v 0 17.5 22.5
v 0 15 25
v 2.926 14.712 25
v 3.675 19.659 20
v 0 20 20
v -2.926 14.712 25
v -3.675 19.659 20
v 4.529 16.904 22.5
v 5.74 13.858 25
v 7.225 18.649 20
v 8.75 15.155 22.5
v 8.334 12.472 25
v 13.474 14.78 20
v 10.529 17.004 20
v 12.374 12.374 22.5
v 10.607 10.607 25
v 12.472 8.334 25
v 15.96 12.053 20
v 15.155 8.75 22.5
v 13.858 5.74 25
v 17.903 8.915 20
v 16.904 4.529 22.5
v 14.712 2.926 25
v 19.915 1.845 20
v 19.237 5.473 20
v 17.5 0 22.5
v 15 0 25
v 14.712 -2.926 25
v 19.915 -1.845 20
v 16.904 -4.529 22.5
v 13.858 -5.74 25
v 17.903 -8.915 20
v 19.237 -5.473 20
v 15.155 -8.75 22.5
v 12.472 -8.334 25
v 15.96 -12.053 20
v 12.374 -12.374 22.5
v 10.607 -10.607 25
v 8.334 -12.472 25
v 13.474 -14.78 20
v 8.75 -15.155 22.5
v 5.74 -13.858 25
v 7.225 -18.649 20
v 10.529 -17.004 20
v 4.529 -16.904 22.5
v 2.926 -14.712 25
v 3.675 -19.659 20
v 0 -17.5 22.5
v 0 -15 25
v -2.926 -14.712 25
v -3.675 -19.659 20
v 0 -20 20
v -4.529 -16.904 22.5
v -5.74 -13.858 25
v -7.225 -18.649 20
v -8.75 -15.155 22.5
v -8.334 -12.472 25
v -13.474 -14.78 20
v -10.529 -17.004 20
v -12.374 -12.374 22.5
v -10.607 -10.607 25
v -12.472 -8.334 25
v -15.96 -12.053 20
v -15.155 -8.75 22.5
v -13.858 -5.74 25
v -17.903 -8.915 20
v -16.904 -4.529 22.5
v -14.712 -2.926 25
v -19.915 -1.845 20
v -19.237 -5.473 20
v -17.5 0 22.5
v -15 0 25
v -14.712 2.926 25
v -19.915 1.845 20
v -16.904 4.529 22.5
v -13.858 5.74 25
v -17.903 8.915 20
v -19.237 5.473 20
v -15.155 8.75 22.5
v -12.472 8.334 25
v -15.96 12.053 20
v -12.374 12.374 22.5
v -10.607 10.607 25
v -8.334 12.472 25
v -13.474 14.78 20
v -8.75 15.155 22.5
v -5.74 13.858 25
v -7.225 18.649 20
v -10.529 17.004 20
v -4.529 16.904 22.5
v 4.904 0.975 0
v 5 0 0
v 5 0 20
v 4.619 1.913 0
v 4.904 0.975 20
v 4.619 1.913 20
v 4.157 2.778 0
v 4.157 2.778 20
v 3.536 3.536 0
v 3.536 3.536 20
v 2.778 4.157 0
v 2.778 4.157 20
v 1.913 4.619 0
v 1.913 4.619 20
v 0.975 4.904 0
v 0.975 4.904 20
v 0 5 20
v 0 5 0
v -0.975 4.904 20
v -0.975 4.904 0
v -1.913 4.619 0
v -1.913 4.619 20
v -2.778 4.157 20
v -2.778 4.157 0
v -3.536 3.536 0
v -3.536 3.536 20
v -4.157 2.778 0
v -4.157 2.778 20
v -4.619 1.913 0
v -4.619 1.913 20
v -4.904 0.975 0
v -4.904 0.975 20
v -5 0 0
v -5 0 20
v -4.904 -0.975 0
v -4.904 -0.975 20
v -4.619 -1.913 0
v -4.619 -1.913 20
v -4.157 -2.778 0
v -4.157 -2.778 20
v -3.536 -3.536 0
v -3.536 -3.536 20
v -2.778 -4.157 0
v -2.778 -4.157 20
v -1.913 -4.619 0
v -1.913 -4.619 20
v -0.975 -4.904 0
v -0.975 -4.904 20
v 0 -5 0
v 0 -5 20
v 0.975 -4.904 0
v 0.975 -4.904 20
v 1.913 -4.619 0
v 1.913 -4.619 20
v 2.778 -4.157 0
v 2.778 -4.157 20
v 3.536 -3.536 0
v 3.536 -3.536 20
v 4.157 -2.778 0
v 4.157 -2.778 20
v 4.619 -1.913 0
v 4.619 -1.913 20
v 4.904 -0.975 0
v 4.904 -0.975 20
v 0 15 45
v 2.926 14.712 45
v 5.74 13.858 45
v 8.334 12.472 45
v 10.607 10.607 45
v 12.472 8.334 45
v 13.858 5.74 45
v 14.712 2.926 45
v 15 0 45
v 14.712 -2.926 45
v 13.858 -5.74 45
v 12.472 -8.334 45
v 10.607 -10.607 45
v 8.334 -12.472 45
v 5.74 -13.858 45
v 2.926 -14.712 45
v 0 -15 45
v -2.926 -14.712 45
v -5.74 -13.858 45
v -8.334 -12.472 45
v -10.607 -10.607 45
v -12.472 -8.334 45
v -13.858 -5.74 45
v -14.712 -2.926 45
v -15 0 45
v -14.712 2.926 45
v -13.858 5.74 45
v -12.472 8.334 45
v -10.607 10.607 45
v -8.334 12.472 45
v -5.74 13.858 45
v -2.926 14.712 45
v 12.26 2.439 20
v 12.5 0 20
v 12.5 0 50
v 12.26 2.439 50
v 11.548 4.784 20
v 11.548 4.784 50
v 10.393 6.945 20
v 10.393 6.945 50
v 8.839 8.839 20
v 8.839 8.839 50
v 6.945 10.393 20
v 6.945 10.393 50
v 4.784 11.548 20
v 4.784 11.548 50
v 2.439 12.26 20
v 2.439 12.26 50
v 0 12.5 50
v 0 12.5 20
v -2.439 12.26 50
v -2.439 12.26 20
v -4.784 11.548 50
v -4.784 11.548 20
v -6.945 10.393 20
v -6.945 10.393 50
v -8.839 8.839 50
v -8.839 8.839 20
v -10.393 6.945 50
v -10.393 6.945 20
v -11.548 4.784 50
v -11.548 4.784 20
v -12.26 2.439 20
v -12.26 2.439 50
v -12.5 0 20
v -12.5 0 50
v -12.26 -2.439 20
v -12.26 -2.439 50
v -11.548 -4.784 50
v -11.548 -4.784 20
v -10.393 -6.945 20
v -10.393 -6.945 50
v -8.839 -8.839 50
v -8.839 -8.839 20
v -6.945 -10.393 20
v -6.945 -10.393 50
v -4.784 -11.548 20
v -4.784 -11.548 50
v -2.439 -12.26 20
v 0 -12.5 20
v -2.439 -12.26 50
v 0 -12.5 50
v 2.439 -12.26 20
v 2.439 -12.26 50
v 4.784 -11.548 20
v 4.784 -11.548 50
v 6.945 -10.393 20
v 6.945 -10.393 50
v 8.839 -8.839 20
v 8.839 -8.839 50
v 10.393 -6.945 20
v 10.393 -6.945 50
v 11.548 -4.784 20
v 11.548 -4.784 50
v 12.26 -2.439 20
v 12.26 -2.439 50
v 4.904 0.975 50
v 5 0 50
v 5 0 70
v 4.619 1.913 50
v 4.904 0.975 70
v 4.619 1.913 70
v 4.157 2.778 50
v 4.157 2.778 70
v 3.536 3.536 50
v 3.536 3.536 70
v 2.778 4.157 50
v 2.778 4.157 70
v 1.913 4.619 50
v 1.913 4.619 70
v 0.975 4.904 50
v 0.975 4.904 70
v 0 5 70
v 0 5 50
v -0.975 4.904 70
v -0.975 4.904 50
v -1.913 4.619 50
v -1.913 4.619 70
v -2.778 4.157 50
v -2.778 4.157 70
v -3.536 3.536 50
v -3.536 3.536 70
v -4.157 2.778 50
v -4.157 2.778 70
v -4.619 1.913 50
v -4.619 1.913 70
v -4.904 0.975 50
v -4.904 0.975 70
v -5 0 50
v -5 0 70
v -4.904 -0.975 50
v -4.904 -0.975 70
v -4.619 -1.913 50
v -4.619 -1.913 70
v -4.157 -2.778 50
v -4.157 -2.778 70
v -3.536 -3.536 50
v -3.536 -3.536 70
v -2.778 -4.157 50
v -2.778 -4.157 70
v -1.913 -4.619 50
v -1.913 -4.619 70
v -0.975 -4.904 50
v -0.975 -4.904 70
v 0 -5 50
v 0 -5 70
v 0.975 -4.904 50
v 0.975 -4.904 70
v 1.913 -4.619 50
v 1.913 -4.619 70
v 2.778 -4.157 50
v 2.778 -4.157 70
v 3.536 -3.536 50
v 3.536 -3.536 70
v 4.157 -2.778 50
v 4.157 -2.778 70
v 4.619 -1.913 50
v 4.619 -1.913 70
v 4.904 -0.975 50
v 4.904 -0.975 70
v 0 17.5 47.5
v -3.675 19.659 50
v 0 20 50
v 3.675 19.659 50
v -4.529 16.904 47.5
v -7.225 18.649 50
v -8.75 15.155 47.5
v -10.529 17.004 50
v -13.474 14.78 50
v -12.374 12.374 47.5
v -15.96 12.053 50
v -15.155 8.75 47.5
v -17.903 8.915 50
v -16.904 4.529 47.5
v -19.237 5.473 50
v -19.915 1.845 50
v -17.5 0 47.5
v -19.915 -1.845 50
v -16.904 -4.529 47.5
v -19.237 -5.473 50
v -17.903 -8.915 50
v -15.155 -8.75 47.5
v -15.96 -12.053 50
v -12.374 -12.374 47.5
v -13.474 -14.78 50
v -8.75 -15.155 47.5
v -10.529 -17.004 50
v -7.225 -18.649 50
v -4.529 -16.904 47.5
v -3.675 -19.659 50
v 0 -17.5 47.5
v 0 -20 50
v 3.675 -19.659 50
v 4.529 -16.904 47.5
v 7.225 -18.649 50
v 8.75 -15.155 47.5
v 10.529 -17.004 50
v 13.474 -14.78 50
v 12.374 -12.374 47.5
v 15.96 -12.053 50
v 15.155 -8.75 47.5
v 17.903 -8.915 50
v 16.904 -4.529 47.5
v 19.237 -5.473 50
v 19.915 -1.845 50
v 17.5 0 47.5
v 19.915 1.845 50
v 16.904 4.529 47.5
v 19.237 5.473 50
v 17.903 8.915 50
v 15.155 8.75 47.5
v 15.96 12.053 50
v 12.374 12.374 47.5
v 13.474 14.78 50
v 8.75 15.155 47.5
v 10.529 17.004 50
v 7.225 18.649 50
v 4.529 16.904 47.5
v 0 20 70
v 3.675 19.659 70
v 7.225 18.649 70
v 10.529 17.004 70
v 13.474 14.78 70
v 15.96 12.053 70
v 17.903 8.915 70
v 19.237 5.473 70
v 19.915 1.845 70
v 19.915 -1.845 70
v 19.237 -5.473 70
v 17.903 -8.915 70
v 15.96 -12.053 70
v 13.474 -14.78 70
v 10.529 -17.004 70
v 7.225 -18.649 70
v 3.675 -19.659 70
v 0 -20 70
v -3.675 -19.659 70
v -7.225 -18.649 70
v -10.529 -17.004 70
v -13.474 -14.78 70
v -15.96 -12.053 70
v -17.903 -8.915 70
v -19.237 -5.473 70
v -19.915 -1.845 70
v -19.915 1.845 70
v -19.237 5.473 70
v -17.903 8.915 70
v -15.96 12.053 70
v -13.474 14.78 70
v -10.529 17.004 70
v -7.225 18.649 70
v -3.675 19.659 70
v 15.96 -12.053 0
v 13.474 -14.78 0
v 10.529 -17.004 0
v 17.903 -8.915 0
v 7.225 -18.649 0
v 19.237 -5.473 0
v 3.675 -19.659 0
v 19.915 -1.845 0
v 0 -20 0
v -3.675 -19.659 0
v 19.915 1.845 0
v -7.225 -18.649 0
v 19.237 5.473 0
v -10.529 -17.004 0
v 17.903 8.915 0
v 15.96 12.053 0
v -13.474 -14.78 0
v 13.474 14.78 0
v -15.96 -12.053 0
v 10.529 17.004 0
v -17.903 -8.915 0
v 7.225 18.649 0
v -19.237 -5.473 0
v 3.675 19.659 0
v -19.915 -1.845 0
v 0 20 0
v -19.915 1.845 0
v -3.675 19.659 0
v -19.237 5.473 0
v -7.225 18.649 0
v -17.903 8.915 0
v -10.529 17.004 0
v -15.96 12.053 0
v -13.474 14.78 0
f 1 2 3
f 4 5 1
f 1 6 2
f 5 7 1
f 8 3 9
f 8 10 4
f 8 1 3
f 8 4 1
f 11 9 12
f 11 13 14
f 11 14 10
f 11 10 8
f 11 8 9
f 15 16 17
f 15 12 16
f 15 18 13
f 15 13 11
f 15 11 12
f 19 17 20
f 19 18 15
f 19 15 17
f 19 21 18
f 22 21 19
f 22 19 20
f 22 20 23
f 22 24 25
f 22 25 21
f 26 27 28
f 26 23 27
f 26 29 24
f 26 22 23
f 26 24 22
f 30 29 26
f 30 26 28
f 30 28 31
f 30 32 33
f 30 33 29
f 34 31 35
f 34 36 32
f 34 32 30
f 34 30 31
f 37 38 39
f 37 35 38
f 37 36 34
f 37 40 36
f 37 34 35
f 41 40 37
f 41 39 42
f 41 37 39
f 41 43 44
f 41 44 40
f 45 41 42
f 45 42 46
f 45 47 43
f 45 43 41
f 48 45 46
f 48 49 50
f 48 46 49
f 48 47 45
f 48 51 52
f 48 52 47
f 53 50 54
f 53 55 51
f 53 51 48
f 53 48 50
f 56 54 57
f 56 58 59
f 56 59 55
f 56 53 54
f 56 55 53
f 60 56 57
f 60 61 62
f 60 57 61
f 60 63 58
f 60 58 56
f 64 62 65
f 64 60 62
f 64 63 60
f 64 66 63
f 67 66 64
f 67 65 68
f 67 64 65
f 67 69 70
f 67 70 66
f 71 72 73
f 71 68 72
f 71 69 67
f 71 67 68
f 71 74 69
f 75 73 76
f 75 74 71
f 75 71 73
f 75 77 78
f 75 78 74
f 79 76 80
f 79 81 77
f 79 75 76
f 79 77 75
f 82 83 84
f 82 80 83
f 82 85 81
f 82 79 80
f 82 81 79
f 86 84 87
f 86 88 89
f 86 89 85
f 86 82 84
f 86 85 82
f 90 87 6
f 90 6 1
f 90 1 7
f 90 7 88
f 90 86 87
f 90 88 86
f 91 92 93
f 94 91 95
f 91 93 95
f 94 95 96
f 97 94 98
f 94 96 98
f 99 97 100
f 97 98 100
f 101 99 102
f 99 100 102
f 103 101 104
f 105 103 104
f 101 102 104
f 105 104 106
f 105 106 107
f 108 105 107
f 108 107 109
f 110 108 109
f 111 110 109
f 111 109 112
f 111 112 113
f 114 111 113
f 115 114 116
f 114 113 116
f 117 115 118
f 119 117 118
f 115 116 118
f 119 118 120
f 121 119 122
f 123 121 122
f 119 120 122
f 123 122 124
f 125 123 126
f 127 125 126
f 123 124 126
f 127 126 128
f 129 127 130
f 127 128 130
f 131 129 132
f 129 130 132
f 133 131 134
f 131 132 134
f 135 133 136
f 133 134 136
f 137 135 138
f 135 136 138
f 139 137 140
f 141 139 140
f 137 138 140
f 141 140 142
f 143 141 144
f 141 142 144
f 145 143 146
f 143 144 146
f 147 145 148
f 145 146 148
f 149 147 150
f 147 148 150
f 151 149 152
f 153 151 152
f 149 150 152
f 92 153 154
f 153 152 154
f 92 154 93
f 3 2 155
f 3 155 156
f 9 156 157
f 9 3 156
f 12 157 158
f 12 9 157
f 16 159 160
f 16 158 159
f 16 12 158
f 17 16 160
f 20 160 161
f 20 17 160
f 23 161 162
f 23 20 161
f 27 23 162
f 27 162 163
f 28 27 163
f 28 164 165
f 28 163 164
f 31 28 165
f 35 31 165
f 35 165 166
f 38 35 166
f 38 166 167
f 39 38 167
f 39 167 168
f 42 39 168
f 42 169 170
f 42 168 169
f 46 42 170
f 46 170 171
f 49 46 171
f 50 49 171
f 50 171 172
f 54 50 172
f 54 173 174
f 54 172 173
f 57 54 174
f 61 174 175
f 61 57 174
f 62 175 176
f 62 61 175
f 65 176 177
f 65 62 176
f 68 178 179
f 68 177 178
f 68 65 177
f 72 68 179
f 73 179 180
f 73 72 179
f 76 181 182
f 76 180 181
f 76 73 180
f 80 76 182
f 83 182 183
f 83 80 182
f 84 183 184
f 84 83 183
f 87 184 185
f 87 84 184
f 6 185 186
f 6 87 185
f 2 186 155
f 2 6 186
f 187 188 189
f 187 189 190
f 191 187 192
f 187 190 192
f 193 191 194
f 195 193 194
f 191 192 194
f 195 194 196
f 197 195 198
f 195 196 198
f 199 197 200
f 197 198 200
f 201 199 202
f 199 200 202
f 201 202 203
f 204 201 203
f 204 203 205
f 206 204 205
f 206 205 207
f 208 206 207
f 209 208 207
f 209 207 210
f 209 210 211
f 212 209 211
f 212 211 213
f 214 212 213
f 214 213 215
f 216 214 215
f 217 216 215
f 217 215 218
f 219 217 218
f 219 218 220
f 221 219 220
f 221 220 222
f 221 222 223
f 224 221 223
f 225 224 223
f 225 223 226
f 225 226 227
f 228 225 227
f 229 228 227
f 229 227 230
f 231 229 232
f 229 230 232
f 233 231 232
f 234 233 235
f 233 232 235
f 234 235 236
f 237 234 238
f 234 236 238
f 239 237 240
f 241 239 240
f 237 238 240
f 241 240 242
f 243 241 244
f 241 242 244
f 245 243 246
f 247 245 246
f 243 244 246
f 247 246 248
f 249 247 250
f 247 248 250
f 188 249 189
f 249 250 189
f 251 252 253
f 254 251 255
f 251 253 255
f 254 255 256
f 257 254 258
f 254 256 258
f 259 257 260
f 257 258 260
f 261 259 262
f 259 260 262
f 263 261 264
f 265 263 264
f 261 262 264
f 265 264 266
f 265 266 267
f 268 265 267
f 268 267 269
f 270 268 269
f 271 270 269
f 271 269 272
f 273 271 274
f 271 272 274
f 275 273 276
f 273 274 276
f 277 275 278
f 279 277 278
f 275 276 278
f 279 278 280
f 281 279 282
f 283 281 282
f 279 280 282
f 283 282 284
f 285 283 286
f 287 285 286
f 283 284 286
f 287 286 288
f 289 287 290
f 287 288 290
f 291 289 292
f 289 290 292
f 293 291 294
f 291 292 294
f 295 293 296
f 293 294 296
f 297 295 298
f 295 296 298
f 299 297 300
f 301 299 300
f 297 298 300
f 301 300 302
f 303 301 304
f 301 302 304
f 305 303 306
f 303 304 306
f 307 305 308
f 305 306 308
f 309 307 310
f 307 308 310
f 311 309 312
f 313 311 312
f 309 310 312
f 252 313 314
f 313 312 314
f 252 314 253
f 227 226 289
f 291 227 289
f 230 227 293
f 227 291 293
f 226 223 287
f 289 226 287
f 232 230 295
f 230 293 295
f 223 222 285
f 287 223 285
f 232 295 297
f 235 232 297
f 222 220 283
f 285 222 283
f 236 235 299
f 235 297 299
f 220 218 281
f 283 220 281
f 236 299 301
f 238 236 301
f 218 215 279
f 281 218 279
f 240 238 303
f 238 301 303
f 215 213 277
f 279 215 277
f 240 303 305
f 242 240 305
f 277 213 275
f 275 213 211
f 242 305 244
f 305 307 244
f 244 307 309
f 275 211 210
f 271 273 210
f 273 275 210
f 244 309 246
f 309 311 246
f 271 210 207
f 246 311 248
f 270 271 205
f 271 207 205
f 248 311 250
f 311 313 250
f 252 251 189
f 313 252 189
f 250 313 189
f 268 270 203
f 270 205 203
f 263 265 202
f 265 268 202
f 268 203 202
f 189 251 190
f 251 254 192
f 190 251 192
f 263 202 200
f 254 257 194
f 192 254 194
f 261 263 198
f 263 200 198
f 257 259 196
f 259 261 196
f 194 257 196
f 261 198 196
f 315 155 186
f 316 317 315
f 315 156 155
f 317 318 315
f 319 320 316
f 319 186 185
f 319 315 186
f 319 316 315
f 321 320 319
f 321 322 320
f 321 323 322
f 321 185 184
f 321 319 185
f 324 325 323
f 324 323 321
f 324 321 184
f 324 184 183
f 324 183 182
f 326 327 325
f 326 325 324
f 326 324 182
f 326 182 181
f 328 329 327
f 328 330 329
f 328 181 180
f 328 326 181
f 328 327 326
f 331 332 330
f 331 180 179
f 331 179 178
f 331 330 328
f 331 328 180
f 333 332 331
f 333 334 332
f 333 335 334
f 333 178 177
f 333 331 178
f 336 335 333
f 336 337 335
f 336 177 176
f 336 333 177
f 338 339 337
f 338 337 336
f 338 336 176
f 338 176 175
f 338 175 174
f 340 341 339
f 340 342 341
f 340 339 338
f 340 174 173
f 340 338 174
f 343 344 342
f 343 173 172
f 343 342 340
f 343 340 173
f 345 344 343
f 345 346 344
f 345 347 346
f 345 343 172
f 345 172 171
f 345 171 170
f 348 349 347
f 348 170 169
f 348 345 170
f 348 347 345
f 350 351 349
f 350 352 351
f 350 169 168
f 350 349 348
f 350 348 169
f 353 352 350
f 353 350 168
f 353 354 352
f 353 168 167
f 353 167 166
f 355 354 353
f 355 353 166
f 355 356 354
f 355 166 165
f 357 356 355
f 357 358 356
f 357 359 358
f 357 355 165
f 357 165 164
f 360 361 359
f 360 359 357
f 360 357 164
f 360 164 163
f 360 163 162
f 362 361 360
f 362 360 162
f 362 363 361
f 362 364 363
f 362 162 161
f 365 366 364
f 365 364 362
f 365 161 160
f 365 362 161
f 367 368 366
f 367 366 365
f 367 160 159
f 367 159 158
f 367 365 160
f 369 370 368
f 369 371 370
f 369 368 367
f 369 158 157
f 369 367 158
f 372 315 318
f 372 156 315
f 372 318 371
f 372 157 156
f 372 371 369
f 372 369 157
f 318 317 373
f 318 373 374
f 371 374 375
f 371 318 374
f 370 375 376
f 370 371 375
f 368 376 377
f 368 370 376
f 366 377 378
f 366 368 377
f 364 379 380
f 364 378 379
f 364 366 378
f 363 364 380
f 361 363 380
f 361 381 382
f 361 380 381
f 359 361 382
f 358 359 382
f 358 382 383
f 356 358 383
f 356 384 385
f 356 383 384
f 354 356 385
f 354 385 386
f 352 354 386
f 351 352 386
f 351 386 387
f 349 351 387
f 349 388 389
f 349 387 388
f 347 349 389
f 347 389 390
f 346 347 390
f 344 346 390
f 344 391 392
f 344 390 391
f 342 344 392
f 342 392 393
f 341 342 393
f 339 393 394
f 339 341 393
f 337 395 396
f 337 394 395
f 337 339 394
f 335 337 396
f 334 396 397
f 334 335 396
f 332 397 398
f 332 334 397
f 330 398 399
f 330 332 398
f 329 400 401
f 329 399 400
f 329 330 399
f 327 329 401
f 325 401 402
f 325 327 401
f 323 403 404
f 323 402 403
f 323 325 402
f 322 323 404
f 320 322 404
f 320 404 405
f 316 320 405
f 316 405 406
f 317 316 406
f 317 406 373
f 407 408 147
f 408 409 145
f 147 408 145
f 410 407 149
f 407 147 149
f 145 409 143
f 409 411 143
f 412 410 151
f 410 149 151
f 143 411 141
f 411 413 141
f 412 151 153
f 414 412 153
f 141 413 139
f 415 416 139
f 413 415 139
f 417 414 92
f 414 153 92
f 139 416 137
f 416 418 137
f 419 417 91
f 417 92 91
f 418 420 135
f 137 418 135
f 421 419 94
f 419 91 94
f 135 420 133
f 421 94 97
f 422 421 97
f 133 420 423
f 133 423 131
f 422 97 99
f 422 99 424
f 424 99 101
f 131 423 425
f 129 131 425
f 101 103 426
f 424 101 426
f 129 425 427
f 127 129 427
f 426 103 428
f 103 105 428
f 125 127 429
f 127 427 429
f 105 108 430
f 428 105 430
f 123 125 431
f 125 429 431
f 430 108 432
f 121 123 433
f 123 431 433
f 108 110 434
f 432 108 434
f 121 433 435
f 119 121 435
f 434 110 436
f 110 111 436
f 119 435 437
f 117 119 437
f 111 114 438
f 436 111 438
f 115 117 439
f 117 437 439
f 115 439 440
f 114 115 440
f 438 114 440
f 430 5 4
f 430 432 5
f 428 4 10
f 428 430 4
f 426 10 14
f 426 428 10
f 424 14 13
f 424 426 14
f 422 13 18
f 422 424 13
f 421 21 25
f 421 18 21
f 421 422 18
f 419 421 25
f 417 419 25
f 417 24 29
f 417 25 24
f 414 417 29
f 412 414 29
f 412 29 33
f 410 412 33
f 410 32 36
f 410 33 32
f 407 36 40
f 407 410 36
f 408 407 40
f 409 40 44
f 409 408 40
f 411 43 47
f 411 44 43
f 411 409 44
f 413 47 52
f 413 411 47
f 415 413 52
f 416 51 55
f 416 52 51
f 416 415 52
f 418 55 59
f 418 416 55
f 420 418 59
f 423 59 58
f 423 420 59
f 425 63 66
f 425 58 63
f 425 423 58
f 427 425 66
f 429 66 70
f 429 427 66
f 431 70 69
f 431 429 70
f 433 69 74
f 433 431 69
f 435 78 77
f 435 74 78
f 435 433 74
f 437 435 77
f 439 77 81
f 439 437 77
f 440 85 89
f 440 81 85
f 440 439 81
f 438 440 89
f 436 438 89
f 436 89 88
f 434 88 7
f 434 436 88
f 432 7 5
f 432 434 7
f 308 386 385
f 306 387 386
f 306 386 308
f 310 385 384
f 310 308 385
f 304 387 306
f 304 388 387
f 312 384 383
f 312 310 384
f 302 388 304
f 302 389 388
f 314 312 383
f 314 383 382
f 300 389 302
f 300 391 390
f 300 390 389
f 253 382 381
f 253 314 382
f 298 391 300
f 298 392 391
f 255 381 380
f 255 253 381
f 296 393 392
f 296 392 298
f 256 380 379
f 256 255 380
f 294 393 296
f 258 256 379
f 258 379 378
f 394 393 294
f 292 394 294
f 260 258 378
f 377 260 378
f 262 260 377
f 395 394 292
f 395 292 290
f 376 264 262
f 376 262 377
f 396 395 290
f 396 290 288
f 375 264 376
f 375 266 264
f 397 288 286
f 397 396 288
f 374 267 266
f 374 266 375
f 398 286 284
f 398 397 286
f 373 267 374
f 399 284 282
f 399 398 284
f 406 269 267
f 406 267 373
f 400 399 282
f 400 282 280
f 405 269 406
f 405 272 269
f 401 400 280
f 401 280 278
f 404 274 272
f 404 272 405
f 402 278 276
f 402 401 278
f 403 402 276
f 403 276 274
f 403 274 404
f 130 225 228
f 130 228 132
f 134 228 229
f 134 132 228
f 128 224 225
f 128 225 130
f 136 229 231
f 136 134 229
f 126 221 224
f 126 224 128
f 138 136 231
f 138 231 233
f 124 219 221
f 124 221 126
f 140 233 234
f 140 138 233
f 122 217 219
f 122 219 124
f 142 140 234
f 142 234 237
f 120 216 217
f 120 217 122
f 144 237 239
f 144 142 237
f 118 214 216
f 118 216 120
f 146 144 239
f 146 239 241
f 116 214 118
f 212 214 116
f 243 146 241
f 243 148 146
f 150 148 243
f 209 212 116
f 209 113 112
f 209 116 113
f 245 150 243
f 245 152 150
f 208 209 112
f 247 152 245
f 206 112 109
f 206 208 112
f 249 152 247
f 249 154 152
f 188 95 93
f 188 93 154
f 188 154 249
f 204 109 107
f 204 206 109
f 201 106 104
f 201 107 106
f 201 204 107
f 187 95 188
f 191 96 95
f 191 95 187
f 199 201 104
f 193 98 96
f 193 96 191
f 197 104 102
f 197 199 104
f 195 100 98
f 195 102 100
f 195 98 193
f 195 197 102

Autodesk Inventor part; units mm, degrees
ref_plane "YZ Plane" through (0, 0, 0) normal (1, 0, 0) x (0, 1, 0)
ref_plane "XZ Plane" through (0, 0, 0) normal (0, 1, 0) x (-1, 0, 0)
ref_plane "XY Plane" through (0, 0, 0) normal (0, 0, 1) x (1, 0, 0)
sketch "스케치4" plane through (0, 0, 0) normal (1, 0, 0) x (0, 1, 0)
  line L0 (0, 0) -> (0, 70)
  line L1 (0, 70) -> (20, 70)
  line L2 (20, 70) -> (20, 50)
  line L3 (20, 50) -> (15, 45)
  line L4 (15, 45) -> (15, 25)
  line L5 (15, 25) -> (20, 20)
  line L6 (20, 20) -> (20, 0)
  line L7 (20, 0) -> (0, 0)
  dimension "d98" = 70
  dimension "d99" = 20
  dimension "d100" = 20
  dimension "d101" = 20
  dimension "d102" = 20
  dimension "d103" = 5
  dimension "d104" = 5
revolve "회전2" add sketch "스케치4" angle 360 about axis through (0, 0, 0) along (0, 0, 1)
sketch "스케치5" plane through (0, 0, 70) normal (0, 0, 1) x (1, 0, 0)
  circle A0 centre (0, 0) radius 5
  dimension "d106" = 10
extrude "돌출1" cut sketch "스케치5" against normal blind 20
sketch "스케치6" plane through (0, 0, 50) normal (0, 0, 1) x (1, 0, 0)
  circle A0 centre (0, 0) radius 12.5
  dimension "d109" = 25
extrude "돌출2" cut sketch "스케치6" against normal blind 30
sketch "스케치7" plane through (0, 0, 20) normal (0, 0, 1) x (1, 0, 0)
  circle A0 centre (0, 0) radius 5
  dimension "d112" = 10
extrude "돌출3" cut sketch "스케치7" against normal up to next
properties part number "기본 투상 연습4"
